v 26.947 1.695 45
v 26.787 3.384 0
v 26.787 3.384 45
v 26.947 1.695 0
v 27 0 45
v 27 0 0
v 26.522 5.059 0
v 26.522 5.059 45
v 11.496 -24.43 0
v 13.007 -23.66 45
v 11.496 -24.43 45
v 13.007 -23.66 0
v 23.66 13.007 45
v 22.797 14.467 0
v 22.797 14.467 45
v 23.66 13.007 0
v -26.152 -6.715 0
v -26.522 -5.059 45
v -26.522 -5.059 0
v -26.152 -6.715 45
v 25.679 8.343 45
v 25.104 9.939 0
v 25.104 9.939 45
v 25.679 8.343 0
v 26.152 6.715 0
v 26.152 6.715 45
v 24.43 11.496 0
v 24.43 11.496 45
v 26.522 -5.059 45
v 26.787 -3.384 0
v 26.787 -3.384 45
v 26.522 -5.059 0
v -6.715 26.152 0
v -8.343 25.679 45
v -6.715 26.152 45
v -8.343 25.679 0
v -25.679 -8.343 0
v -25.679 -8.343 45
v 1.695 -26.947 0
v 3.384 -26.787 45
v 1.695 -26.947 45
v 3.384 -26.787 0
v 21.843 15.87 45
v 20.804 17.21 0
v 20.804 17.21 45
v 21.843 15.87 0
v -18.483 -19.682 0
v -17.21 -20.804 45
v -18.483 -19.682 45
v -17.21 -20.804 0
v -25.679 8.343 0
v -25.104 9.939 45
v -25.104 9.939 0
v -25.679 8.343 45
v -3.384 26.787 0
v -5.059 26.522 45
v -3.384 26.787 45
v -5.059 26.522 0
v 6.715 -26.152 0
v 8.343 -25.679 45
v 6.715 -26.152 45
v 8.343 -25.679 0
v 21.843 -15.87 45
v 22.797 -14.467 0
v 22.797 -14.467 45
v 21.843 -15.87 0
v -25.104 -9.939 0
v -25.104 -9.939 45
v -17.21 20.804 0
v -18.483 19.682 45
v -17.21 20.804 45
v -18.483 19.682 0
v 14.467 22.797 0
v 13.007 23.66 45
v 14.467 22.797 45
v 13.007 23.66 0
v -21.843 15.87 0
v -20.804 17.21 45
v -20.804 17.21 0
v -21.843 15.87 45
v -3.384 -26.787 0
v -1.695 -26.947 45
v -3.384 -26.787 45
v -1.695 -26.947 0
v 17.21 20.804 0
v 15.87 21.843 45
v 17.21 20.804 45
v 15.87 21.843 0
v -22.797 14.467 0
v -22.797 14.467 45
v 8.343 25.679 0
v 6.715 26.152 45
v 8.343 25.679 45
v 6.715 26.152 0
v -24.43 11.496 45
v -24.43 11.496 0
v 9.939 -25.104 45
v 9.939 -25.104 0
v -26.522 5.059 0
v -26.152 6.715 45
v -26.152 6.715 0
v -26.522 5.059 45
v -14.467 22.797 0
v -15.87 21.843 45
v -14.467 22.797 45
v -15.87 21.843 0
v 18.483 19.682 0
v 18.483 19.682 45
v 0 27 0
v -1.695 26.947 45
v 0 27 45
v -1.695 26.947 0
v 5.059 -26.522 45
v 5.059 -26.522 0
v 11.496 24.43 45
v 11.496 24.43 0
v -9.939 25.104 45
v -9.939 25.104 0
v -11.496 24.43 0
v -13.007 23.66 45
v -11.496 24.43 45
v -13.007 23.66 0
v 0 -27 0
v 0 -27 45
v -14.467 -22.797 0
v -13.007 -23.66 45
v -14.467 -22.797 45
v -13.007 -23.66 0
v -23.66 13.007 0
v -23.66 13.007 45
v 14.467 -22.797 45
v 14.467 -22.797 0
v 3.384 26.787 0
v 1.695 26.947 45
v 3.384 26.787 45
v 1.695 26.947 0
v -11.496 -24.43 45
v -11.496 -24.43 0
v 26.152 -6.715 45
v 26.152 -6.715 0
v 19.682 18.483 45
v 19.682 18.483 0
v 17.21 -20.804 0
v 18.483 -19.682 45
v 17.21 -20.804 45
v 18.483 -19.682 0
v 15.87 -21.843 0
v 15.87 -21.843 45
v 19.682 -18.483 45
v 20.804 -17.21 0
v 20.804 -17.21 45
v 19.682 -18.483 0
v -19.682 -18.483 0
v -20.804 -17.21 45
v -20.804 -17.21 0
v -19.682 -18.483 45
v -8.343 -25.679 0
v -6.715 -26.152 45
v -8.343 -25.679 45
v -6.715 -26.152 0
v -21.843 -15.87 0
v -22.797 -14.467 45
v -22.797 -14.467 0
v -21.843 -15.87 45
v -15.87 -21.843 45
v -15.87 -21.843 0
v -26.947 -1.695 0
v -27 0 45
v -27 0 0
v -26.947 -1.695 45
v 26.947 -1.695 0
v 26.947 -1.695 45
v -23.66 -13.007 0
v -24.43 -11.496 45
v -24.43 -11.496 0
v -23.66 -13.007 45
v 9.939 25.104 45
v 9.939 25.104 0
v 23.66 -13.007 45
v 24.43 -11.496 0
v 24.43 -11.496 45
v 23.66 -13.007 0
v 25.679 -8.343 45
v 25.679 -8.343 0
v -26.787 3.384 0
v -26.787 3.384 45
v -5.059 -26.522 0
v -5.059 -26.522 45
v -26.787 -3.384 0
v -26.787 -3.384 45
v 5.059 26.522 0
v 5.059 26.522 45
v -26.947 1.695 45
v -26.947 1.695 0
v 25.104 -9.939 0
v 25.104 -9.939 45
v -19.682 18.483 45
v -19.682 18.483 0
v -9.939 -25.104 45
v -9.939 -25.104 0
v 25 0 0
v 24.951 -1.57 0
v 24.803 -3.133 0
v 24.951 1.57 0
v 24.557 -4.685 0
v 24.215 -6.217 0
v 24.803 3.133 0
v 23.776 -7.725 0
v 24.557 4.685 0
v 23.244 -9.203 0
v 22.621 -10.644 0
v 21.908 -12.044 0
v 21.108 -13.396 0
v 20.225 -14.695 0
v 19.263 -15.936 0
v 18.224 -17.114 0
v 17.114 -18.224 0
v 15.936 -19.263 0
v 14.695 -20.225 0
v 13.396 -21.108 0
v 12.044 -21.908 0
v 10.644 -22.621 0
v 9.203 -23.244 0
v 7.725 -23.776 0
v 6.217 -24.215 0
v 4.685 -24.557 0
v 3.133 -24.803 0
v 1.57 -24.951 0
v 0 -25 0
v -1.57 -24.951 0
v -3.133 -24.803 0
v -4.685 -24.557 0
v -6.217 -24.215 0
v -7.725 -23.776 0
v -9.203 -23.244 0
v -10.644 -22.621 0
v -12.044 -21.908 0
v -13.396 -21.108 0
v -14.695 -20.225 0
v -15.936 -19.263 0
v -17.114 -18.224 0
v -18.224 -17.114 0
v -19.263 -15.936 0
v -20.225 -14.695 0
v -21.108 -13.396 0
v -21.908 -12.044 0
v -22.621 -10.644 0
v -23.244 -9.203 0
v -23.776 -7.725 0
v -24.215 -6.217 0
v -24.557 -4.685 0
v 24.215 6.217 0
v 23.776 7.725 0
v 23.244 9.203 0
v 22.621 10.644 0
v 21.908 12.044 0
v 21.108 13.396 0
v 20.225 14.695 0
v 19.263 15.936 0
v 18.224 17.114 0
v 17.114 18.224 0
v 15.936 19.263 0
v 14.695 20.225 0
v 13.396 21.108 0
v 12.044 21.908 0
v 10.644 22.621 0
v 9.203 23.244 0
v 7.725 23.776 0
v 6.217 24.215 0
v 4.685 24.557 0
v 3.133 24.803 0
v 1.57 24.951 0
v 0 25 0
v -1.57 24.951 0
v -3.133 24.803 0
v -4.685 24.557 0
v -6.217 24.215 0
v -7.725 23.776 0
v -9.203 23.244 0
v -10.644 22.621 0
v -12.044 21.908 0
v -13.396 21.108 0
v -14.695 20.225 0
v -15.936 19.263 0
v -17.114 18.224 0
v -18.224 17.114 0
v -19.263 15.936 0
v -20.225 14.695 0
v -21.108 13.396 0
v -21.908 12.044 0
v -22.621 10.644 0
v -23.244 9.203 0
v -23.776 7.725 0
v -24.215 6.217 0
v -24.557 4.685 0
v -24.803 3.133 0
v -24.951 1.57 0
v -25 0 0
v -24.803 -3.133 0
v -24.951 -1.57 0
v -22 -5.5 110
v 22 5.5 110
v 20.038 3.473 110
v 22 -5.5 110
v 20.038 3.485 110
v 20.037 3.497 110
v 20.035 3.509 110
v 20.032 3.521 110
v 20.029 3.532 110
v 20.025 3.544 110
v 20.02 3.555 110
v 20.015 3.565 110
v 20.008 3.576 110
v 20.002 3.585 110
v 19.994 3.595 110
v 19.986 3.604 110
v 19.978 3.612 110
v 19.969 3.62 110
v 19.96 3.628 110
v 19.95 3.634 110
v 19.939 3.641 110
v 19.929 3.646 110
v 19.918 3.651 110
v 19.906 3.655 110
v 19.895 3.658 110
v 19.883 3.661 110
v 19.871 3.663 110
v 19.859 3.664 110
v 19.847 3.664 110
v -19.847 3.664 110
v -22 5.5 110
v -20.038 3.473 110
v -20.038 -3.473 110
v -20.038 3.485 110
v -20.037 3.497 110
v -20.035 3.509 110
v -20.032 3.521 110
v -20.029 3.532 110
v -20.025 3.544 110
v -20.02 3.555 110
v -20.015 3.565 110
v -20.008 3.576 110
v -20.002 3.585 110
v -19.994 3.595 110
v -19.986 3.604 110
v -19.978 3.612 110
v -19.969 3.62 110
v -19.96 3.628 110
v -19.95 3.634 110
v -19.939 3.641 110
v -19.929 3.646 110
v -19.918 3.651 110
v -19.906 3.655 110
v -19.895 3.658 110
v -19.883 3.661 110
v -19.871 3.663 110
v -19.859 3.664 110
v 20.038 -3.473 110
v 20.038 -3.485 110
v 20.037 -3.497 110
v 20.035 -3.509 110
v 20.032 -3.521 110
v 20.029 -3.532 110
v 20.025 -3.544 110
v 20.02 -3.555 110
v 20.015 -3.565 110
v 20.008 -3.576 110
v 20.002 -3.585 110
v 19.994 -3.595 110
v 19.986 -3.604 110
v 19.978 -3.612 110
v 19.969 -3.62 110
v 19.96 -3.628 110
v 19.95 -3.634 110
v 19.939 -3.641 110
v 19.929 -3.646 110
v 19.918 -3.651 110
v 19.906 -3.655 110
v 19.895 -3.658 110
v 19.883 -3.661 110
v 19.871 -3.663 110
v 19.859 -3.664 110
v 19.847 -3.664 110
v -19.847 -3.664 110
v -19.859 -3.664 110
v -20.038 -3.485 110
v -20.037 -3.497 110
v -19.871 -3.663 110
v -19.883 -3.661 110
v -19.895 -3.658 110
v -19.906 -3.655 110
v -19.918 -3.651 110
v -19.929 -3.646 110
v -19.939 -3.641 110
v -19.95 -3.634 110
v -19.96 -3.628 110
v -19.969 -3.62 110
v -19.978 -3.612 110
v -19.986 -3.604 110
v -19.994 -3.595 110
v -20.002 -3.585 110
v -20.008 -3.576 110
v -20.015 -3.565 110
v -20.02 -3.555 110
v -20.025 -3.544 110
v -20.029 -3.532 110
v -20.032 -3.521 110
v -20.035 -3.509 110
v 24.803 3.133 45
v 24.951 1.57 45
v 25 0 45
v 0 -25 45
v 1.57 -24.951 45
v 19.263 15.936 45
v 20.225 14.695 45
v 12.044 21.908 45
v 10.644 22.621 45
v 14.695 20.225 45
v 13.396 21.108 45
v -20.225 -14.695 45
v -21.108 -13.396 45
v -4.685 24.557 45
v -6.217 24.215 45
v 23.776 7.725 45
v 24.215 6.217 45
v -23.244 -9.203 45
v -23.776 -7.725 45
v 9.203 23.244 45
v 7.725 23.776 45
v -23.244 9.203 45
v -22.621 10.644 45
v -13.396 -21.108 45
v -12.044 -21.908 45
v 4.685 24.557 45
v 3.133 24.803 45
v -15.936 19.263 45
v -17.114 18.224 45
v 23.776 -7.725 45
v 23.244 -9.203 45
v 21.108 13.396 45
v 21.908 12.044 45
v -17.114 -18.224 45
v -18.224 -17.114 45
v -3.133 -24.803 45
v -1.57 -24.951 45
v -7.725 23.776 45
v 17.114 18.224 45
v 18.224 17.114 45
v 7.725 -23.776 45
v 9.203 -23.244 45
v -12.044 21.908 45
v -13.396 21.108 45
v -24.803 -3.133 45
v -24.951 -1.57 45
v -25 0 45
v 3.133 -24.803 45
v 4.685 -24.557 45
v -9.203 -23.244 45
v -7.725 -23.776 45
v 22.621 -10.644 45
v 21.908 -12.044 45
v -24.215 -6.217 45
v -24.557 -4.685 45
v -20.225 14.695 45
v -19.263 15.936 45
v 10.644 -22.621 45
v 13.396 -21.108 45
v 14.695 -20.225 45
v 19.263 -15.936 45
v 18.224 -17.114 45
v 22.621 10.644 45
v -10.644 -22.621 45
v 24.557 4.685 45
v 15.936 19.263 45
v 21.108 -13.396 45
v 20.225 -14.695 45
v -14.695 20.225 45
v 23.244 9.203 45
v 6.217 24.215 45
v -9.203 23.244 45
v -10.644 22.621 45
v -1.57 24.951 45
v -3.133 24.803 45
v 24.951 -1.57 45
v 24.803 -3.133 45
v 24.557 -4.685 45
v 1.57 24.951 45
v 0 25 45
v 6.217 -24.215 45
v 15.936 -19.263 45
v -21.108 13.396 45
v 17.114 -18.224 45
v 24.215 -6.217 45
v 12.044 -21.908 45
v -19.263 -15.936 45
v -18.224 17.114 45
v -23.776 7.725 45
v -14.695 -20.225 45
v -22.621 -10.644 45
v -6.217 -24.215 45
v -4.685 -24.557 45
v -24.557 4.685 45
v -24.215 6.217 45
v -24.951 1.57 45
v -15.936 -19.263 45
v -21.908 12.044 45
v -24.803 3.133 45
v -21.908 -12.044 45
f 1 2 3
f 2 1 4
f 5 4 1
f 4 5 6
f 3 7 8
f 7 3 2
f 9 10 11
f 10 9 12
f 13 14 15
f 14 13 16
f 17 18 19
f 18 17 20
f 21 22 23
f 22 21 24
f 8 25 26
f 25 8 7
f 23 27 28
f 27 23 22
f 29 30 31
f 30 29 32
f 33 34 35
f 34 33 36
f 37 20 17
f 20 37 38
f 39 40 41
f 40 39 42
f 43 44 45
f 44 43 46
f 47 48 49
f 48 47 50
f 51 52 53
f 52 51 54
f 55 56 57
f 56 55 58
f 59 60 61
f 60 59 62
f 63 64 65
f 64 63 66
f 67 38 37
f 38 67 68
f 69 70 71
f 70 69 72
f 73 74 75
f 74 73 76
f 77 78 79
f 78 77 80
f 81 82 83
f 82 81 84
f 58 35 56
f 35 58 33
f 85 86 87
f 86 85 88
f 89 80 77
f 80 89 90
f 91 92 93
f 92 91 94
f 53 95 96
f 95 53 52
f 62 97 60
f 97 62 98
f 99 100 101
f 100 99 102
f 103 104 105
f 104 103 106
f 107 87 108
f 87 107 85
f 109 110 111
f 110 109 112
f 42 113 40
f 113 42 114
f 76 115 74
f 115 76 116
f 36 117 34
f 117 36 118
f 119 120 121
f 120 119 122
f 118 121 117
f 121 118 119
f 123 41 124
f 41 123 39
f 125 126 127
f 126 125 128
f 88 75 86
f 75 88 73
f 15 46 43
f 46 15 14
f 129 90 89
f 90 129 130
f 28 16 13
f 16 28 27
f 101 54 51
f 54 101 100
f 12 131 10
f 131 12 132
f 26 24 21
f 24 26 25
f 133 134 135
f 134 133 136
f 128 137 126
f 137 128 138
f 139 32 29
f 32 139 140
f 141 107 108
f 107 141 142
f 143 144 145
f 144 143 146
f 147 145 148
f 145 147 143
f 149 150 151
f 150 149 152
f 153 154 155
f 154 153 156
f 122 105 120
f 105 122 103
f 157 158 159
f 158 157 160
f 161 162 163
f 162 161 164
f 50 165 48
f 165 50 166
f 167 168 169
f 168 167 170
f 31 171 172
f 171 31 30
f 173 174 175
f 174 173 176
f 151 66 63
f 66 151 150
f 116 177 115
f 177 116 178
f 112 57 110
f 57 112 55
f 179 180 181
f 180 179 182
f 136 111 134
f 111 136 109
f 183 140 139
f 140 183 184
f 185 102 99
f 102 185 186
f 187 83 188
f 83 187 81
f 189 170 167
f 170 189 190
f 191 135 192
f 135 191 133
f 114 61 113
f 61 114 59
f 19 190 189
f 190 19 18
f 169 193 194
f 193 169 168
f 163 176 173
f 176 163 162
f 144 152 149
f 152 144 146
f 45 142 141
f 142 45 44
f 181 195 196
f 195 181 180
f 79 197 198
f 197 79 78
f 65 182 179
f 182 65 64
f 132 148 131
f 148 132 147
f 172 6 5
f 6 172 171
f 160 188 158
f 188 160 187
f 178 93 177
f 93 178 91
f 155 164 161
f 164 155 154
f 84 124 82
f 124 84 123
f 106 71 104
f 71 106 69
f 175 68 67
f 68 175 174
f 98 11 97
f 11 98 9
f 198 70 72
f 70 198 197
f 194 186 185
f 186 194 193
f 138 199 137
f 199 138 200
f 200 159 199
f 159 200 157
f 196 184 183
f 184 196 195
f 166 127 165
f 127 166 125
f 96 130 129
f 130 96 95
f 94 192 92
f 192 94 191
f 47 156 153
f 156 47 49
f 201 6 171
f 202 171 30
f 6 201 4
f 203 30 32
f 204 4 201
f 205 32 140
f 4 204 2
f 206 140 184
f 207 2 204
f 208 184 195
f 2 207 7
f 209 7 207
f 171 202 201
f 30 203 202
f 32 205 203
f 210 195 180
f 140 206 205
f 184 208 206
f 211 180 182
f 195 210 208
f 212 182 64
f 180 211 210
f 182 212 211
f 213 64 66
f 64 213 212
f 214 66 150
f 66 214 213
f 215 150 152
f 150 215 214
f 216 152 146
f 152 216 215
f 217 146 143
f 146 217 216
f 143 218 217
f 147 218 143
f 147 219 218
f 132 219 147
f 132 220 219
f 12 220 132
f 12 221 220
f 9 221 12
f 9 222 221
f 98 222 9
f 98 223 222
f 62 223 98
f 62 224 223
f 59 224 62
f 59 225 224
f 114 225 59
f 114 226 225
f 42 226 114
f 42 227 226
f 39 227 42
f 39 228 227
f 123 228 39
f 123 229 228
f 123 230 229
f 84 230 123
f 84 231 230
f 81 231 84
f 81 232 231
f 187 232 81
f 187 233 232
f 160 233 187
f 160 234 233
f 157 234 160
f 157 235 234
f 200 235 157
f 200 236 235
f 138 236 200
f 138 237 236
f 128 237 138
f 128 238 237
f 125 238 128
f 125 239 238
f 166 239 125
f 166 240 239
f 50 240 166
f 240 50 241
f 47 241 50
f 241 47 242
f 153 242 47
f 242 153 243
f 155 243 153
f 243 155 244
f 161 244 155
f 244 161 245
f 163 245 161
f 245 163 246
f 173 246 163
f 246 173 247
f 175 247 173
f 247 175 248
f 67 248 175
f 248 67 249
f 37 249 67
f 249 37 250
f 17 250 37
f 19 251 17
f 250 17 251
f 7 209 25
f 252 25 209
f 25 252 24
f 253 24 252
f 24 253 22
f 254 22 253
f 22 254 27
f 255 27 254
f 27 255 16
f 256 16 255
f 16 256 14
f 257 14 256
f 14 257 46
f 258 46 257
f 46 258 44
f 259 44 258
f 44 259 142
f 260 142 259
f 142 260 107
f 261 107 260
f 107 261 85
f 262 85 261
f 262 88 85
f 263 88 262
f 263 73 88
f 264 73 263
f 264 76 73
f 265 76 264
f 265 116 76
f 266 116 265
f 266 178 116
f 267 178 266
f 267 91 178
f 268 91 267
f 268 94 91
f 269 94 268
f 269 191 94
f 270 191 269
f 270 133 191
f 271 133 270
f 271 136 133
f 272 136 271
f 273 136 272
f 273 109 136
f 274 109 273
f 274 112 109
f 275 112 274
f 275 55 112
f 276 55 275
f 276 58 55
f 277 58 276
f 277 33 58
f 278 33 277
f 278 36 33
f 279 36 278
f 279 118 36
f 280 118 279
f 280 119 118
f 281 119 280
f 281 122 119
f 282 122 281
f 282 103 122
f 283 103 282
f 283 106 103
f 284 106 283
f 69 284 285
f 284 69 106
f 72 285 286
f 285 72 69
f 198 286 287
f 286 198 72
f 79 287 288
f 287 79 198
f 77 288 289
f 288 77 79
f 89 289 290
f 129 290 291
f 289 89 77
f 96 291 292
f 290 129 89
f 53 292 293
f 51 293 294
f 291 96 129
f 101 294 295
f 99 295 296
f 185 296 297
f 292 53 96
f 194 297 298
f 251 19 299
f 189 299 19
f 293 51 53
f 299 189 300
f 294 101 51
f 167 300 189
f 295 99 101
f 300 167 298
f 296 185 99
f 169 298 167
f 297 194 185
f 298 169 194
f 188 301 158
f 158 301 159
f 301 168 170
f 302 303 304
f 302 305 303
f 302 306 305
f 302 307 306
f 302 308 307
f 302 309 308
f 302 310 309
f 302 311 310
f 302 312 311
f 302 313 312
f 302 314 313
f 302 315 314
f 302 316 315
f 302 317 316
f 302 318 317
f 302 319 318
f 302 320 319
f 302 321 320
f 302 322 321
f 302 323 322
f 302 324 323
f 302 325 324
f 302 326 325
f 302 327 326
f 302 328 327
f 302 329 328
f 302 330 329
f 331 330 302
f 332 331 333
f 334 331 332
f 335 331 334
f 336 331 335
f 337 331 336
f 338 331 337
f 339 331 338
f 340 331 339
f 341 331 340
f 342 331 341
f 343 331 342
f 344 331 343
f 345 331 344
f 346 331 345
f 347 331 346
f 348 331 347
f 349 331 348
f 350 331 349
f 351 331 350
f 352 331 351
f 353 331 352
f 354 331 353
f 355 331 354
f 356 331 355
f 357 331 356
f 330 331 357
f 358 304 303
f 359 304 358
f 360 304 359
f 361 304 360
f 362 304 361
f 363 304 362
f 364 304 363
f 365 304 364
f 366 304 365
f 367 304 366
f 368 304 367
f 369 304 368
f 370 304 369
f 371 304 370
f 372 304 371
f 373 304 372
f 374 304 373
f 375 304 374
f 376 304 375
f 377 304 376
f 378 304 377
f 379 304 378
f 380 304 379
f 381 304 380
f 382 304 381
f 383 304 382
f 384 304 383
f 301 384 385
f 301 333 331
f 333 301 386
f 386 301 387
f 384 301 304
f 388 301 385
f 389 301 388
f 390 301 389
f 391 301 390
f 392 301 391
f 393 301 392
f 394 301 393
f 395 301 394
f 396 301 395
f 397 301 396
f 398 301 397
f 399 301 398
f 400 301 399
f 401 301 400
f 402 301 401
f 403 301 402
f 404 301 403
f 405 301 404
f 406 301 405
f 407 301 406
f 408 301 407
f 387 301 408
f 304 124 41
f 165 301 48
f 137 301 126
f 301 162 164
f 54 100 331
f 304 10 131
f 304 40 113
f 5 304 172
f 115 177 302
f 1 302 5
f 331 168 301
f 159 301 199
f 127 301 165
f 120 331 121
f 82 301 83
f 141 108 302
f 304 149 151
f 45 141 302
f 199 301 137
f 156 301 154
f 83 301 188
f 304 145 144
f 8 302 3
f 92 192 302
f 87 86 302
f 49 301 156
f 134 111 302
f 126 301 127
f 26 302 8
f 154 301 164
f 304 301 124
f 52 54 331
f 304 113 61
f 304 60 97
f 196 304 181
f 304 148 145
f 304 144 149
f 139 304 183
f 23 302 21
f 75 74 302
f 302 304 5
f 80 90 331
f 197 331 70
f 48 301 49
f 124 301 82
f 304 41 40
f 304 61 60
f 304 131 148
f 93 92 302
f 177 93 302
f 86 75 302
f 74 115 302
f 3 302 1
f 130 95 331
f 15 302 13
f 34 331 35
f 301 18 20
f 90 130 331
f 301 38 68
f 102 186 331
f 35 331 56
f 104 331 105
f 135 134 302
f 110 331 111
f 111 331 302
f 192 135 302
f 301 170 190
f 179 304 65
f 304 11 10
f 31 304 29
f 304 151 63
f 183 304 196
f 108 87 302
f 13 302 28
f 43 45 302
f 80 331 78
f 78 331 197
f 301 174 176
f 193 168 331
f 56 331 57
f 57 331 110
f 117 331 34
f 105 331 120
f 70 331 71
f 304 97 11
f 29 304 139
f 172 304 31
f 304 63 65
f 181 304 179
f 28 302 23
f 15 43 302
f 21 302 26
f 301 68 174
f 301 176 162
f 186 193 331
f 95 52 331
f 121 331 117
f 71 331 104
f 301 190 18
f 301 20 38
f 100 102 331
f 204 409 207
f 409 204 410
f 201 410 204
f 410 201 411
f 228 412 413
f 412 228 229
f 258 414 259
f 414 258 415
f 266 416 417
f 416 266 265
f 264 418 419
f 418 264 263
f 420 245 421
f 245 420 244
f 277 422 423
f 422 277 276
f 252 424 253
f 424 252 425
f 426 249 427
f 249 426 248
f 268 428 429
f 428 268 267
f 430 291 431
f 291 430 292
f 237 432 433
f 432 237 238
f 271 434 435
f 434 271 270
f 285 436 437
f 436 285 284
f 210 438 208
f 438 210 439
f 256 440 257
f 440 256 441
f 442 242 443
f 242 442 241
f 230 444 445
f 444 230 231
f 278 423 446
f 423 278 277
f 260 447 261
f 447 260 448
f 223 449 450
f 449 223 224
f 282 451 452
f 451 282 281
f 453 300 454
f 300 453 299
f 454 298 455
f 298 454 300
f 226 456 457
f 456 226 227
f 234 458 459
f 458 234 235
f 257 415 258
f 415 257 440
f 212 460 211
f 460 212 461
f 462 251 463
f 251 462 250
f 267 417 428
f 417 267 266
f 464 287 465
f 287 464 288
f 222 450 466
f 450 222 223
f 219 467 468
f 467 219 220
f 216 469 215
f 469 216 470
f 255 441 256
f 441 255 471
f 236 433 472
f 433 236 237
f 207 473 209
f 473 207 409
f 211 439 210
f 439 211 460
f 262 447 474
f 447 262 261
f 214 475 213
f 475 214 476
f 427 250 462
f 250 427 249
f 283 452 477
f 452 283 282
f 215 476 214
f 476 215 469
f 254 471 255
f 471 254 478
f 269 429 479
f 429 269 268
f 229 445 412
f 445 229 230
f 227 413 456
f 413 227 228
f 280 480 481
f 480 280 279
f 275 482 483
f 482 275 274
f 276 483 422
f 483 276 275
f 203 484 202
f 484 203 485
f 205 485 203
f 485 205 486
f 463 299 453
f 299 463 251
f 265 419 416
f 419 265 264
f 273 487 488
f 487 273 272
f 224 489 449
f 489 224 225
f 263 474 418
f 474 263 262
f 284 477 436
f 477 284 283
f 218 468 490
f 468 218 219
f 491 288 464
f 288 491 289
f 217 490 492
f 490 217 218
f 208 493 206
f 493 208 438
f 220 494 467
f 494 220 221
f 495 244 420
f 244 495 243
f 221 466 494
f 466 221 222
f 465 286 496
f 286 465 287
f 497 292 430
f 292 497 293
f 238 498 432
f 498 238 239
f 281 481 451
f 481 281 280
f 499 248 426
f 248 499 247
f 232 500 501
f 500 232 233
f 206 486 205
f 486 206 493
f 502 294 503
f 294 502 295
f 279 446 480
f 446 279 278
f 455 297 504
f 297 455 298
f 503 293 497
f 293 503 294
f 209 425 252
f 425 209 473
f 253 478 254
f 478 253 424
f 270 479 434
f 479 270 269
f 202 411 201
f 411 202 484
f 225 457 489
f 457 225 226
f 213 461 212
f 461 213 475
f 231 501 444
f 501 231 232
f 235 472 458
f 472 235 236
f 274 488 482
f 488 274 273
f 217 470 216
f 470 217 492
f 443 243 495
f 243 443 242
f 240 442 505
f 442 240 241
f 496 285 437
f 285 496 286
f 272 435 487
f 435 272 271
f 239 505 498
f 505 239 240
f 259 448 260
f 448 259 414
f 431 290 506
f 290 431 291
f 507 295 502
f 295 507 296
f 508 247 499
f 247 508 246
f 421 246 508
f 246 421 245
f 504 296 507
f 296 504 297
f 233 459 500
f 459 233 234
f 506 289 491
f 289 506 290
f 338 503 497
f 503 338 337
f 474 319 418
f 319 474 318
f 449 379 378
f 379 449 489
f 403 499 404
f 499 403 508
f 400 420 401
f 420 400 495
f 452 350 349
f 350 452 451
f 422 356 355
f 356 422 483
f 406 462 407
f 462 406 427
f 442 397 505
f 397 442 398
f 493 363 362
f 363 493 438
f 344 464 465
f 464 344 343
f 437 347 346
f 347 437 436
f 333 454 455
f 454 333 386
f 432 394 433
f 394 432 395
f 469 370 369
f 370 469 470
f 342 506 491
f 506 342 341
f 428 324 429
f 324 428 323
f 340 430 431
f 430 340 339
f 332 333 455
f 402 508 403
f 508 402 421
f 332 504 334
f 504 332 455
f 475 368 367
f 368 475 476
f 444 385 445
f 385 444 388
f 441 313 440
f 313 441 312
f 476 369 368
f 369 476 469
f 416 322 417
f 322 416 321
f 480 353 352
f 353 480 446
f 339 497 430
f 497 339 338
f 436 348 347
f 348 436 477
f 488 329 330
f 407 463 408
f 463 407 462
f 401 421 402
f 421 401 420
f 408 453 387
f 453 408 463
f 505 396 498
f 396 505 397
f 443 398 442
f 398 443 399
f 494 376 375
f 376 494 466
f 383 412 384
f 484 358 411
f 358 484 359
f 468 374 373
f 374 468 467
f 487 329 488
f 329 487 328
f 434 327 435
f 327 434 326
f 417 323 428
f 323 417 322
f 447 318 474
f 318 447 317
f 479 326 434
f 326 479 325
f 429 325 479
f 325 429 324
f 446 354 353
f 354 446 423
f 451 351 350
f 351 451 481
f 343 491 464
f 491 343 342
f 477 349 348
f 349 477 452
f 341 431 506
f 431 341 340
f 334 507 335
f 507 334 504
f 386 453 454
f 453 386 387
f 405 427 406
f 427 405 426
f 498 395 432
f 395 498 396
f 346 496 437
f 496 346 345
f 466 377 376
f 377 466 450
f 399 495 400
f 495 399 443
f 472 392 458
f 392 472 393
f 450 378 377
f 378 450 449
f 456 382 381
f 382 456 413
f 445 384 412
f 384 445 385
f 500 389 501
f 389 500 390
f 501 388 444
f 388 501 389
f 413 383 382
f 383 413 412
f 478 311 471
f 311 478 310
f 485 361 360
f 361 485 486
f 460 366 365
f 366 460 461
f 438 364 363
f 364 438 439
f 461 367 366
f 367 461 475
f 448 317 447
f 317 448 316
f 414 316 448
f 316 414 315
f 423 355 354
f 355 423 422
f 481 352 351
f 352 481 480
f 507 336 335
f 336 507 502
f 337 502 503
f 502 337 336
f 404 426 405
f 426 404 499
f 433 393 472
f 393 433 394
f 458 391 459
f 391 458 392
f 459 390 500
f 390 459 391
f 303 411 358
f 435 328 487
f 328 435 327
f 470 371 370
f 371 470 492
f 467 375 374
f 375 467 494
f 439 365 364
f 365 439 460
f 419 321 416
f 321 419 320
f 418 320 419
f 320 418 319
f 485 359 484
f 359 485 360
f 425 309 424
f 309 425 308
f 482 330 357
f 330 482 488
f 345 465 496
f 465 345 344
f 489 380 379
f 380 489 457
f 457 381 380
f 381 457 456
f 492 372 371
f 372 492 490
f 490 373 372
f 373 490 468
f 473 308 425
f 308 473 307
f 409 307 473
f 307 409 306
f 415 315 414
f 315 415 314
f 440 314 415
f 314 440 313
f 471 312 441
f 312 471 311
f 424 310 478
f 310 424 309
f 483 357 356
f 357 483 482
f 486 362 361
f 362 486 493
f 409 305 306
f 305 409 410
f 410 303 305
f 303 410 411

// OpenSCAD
innerRadius = 25;
wallThickness = 2;
nozzleWidth = 40;
nozzleHeight = 7;

difference()
{
union()
{
    translate([0,0,0])cylinder(25, innerRadius+wallThickness, innerRadius+wallThickness, false, $fn = 100);
    
        hull()
        {
        translate([0,0,20])cylinder(25, innerRadius+wallThickness, innerRadius+wallThickness, false, $fn = 100);
        translate([0,0,90])cube([nozzleWidth+2*wallThickness, nozzleHeight+2*wallThickness, 40], true);
           
        }
}
union()
    {
    translate([0,0,-1])cylinder(26, innerRadius, innerRadius, false, $fn = 100);
        
        hull()
        {
        translate([0,0,19])cylinder(26, innerRadius, innerRadius, false, $fn = 100);
        translate([0,0,90])cube([nozzleWidth, nozzleHeight, 41], true);
           
        }
    }
}
